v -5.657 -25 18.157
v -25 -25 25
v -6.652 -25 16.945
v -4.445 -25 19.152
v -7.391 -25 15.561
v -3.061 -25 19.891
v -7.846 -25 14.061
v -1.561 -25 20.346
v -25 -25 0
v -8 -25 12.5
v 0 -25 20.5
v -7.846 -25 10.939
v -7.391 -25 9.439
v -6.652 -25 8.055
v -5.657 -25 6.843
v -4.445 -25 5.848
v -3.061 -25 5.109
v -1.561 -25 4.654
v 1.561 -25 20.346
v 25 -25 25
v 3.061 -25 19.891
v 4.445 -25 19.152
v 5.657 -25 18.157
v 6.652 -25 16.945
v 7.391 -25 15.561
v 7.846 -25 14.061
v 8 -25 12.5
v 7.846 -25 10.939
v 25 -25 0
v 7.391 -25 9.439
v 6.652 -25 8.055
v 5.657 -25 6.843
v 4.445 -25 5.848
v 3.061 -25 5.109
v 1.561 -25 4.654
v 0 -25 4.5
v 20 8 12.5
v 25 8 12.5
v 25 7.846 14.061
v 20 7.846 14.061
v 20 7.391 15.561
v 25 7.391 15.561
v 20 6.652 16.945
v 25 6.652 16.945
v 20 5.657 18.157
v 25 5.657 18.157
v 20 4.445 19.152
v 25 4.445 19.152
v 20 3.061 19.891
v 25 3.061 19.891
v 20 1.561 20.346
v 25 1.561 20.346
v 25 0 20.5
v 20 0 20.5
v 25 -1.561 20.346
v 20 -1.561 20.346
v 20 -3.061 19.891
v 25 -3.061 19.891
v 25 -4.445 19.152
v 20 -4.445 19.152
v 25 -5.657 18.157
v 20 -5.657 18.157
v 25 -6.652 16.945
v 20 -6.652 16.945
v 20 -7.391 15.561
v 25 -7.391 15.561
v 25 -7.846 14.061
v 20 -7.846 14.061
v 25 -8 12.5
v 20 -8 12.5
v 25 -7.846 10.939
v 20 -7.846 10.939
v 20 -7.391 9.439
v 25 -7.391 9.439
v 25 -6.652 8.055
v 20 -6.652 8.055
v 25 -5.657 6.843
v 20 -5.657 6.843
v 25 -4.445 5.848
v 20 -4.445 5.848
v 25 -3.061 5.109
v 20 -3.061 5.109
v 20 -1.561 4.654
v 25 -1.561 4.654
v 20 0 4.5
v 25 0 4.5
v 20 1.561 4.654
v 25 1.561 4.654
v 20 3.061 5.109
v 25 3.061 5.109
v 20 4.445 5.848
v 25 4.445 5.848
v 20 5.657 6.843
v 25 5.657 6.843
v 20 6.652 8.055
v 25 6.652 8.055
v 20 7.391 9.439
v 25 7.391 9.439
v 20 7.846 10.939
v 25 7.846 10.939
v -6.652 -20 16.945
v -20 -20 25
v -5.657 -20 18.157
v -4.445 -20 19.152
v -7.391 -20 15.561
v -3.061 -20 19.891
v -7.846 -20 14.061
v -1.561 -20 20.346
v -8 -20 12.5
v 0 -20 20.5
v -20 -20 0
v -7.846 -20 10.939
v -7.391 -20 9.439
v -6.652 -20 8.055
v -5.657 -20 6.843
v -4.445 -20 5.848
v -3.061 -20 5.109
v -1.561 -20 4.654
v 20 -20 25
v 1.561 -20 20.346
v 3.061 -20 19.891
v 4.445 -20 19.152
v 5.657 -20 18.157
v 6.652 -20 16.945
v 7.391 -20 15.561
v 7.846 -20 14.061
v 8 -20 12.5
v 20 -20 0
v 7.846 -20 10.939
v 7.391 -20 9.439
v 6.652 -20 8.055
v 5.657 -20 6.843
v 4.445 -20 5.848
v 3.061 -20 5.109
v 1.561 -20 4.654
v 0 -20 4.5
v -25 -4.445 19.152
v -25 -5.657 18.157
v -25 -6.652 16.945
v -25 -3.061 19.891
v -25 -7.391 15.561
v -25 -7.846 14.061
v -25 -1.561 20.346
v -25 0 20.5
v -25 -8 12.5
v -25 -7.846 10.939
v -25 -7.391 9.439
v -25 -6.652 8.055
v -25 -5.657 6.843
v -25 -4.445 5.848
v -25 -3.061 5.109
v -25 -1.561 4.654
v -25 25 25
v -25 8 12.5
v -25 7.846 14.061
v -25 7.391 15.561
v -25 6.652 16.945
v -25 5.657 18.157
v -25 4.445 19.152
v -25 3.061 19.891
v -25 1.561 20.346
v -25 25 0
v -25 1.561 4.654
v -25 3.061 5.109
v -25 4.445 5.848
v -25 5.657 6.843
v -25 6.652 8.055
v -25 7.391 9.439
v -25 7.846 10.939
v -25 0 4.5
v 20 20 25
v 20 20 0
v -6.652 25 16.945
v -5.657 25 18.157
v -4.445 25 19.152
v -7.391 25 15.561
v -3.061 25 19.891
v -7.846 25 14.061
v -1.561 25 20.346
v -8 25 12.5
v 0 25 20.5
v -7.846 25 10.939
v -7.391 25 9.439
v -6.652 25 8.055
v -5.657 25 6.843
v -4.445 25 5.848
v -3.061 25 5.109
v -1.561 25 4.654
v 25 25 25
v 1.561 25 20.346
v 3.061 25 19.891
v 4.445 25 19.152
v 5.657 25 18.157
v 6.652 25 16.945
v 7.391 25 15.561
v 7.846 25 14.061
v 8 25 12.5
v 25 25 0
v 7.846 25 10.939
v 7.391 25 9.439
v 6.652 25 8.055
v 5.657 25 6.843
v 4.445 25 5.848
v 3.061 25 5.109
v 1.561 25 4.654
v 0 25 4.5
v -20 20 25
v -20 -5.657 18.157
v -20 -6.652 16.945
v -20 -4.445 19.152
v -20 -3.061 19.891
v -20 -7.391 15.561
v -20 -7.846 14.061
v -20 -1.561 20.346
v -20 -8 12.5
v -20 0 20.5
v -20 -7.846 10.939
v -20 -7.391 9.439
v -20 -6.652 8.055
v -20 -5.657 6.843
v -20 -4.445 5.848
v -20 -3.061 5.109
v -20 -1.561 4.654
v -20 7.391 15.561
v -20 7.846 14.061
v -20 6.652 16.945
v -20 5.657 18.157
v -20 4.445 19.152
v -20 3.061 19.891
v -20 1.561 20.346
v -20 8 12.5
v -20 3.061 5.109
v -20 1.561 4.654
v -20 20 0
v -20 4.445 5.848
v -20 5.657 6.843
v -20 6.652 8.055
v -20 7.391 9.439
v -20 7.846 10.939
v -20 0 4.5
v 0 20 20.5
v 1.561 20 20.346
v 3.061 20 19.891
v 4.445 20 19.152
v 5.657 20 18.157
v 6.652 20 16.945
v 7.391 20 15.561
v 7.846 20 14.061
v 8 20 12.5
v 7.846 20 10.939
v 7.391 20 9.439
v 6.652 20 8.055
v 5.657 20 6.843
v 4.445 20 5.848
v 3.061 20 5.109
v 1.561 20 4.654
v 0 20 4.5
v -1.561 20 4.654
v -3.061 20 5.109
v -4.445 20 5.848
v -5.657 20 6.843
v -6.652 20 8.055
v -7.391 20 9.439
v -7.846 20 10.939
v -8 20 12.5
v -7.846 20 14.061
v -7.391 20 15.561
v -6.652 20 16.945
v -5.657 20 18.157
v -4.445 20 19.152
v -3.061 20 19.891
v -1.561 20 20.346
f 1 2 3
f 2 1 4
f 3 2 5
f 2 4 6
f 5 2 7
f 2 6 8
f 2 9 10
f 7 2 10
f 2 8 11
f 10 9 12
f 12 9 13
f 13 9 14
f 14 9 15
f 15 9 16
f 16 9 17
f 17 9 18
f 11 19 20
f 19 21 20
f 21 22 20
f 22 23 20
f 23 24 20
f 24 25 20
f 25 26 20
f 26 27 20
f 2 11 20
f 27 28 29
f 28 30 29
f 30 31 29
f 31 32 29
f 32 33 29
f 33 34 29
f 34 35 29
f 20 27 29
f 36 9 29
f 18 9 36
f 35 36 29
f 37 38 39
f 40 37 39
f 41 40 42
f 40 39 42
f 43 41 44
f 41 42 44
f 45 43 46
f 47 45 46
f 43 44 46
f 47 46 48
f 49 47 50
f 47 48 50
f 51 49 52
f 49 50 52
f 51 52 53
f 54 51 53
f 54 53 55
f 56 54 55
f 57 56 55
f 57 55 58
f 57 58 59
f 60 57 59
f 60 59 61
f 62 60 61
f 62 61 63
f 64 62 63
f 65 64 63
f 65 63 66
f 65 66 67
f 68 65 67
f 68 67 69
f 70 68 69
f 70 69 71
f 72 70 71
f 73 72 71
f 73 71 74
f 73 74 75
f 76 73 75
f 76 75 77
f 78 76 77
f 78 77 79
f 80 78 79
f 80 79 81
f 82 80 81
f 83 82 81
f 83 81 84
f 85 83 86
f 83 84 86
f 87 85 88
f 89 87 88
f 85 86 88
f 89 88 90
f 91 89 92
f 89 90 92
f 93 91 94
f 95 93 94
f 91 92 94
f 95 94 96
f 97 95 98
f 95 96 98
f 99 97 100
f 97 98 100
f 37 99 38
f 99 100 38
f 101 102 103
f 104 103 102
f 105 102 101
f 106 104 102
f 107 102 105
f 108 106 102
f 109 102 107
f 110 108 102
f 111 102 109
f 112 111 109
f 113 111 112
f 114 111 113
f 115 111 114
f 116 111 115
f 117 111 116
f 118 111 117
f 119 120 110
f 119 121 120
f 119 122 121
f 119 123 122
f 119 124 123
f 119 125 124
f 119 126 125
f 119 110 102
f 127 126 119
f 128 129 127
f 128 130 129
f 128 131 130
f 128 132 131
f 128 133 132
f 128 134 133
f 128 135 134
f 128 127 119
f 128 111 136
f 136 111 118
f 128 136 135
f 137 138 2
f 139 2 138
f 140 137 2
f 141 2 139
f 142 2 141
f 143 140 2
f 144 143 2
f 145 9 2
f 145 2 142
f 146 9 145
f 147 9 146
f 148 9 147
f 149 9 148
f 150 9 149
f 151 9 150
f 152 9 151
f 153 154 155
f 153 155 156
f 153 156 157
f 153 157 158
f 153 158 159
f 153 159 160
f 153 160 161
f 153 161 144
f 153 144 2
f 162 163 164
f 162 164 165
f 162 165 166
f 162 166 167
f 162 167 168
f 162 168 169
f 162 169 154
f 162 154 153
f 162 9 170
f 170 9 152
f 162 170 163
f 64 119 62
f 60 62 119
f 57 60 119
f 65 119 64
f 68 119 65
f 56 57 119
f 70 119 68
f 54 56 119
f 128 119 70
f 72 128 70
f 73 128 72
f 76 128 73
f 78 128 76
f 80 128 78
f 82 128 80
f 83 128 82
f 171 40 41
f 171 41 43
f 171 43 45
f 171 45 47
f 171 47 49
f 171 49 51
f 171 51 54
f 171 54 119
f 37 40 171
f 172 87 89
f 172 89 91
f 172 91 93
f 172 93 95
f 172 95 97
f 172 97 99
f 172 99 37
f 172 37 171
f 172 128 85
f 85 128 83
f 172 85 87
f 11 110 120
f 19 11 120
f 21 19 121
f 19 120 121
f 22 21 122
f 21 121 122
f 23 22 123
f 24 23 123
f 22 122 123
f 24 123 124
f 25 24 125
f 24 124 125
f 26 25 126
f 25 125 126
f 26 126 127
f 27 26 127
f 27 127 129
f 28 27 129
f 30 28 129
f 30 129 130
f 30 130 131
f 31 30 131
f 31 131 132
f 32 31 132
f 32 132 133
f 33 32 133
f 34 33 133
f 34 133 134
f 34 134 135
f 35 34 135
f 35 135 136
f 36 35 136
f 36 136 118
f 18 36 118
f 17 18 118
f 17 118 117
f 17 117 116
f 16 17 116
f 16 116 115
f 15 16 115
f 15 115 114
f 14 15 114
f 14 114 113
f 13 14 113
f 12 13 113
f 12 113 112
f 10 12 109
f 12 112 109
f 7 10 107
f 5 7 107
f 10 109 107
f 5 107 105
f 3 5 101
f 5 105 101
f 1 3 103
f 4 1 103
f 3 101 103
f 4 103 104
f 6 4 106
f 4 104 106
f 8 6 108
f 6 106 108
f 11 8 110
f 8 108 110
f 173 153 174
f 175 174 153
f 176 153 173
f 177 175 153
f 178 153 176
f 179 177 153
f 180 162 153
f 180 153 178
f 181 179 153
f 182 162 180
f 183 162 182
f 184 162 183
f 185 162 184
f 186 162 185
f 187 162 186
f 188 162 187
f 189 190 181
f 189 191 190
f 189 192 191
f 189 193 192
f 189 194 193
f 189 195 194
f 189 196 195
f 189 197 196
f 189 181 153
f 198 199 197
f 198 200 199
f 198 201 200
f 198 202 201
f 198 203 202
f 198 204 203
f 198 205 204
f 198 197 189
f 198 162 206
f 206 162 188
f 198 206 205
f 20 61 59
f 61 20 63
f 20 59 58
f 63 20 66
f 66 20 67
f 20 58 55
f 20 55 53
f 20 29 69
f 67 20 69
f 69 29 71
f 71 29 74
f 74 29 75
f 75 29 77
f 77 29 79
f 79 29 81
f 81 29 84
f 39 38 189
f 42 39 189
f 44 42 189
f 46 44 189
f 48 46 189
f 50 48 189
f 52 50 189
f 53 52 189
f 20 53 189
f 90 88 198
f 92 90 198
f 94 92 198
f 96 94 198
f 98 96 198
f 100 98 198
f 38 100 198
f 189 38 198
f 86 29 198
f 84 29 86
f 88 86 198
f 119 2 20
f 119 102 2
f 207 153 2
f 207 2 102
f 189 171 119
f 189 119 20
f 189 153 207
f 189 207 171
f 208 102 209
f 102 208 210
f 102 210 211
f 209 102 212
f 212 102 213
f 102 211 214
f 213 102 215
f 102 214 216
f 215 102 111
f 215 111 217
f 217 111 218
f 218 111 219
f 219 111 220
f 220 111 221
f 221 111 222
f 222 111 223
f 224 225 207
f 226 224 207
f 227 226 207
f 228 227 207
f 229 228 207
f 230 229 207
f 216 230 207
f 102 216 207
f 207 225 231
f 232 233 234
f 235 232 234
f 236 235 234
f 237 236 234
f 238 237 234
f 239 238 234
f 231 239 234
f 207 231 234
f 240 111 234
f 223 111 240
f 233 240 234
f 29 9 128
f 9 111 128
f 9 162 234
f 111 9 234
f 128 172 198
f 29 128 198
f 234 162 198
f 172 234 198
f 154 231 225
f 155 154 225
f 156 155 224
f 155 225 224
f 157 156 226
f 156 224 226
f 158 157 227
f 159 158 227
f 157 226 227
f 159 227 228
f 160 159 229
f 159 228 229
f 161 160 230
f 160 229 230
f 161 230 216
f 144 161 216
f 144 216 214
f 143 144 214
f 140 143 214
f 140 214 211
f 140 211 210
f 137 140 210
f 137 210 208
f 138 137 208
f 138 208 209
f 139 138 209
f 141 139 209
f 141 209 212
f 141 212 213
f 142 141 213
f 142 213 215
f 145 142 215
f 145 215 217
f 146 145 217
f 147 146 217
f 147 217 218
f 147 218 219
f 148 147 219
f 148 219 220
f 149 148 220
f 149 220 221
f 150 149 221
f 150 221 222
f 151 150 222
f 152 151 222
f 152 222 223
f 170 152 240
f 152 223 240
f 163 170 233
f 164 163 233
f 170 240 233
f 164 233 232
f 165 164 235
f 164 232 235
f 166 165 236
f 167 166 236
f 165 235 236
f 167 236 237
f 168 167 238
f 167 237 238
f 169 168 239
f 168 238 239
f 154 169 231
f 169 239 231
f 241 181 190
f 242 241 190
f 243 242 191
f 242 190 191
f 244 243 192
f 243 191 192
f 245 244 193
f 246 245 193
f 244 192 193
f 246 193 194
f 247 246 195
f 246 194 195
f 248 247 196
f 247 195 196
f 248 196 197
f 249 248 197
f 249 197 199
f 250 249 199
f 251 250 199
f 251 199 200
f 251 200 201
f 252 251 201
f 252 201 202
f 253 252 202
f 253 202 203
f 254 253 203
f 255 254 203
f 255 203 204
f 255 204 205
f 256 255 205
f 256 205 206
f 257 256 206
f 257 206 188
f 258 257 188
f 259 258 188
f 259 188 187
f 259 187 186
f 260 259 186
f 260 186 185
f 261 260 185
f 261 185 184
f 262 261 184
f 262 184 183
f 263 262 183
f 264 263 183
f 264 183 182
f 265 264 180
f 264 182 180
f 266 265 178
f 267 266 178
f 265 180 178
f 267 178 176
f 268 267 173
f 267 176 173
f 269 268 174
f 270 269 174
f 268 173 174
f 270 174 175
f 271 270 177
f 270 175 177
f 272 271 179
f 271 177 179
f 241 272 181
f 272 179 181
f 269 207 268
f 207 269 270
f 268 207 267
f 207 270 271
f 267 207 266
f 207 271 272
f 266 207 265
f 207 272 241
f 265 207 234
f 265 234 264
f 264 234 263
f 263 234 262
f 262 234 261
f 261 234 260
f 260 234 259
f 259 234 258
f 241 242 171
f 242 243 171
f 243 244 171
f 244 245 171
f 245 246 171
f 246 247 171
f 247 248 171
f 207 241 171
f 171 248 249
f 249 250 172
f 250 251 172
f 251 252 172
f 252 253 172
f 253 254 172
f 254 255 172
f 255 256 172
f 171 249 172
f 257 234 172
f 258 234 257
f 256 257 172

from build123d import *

# Parameters (mm, degrees)
CROQUIS1_W              = 50
CROQUIS1_H              = 50
CROQUIS1_W_2            = 40
CROQUIS1_H_2            = 40
SALIENTE_EXTRUIR1_DEPTH = 25
CROQUIS2_R              = 8
CORTAR_EXTRUIR1_DEPTH   = 60
CROQUIS3_R              = 8
CORTAR_EXTRUIR2_DEPTH   = 60


with BuildPart() as part:
    # Croquis1 → Saliente-Extruir1 (new body)
    with BuildSketch(Plane.XY):
        Rectangle(CROQUIS1_W, CROQUIS1_H)
        Rectangle(CROQUIS1_W_2, CROQUIS1_H_2, mode=Mode.SUBTRACT)
    extrude(amount=SALIENTE_EXTRUIR1_DEPTH)

    # Croquis2 → Cortar-Extruir1 (cut)
    with BuildSketch(Plane(origin=(0, 25, 0), x_dir=(1, 0, 0), z_dir=(0, 1, 0))):
        with Locations(Location((0, -12.5, 0), (0, 0, 270))):
            Circle(CROQUIS2_R)
    extrude(amount=-CORTAR_EXTRUIR1_DEPTH, mode=Mode.SUBTRACT)

    # Croquis3 → Cortar-Extruir2 (cut)
    with BuildSketch(Plane(origin=(25, 0, 0), x_dir=(0, 0, -1), z_dir=(1, 0, 0))):
        with Locations(Location((-12.5, 0, 0), (0, 0, 90))):
            Circle(CROQUIS3_R)
    extrude(amount=-CORTAR_EXTRUIR2_DEPTH, mode=Mode.SUBTRACT)


solid = part.part
